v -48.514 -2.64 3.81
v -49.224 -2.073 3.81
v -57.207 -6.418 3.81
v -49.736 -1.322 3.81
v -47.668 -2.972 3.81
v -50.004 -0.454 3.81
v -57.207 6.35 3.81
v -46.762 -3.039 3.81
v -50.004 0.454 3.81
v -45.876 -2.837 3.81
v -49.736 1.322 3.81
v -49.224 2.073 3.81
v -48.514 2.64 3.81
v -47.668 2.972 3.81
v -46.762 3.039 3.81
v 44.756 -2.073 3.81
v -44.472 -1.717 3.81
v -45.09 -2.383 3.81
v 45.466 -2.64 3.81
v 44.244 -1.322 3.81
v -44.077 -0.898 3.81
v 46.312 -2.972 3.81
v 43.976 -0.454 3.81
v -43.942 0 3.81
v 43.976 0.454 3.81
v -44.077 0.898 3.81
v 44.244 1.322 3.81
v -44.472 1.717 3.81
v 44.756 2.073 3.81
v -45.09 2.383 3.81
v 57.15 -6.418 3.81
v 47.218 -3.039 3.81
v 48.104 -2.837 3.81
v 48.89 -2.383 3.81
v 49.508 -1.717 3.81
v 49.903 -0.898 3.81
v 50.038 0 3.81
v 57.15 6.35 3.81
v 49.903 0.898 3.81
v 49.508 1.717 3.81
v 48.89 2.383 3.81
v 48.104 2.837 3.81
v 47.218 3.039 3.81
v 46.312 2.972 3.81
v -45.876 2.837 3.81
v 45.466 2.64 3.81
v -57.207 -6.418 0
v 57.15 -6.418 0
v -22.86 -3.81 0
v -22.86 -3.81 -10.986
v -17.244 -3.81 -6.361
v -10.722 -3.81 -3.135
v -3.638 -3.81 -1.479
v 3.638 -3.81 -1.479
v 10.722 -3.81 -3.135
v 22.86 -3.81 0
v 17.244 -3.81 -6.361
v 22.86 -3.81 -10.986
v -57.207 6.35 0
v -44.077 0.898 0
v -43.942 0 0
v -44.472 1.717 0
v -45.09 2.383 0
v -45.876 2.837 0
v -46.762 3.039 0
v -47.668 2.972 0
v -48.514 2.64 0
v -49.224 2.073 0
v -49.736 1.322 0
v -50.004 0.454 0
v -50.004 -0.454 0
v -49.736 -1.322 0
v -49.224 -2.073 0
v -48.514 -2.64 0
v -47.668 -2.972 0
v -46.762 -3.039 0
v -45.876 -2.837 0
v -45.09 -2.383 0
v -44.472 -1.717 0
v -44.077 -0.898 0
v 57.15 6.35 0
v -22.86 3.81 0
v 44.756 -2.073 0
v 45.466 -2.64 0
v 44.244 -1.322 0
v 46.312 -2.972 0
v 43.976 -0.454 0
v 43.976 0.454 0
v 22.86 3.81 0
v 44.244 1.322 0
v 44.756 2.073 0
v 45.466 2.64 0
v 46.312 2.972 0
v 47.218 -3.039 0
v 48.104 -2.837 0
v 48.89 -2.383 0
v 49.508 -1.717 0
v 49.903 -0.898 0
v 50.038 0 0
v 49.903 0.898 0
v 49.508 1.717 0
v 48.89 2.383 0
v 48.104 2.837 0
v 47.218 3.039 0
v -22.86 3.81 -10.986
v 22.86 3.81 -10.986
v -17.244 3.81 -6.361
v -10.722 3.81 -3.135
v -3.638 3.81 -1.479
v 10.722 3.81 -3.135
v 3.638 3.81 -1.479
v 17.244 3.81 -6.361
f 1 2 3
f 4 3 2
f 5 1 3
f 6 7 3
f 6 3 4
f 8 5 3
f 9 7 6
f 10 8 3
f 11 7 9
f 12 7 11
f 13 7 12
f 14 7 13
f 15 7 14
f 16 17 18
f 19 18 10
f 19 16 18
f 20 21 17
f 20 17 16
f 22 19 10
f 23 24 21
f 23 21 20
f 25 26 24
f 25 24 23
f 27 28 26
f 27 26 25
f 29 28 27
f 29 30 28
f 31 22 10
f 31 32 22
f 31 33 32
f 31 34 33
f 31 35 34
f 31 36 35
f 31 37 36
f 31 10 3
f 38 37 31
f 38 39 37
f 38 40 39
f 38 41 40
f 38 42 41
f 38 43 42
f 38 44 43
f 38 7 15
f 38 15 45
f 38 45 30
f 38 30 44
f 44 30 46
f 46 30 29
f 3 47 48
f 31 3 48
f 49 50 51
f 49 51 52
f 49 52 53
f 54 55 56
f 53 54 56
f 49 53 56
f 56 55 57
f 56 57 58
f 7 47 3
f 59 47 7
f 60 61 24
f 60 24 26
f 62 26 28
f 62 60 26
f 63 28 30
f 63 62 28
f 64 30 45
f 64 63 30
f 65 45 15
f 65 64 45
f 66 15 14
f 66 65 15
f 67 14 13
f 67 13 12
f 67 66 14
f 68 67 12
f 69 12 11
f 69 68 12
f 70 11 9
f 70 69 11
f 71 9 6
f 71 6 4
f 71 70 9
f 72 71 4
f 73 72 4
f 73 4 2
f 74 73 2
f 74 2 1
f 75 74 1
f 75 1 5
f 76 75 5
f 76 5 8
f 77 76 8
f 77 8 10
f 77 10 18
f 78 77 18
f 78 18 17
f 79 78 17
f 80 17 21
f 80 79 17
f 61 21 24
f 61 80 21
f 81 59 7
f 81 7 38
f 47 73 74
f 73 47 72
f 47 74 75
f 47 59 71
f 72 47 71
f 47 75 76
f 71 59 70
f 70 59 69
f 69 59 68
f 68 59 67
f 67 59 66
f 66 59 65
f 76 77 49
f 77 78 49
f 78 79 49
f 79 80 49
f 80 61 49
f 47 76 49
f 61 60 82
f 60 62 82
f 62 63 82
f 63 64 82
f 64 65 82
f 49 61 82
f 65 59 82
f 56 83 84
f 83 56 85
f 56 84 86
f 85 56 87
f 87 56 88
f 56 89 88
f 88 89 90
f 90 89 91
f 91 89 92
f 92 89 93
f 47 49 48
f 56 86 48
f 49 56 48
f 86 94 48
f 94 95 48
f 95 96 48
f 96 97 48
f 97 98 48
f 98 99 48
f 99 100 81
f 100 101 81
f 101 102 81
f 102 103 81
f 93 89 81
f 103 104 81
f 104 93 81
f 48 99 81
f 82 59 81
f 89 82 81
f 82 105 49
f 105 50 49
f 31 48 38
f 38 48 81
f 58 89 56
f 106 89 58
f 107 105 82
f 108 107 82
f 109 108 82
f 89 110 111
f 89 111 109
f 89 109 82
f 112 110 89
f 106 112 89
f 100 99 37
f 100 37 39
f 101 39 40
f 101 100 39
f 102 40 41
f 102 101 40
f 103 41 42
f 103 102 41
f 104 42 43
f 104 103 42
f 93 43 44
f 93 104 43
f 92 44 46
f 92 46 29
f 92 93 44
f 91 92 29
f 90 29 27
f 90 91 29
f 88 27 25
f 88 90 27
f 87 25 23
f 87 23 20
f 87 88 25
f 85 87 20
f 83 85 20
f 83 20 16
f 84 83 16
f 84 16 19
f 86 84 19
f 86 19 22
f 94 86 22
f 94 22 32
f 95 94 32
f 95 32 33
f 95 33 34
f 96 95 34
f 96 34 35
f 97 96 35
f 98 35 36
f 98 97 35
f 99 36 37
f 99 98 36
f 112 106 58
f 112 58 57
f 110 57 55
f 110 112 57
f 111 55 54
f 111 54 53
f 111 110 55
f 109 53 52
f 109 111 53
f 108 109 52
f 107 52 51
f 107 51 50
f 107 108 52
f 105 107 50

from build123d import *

# Parameters (mm, degrees)
SKETCH2_W                = 114.356575713
SKETCH2_H                = 12.768326156
SKETCH2_R                = 3.048
BOSS_EXTRUDE1_DEPTH      = 3.81
BOSS_EXTRUDE2_DEPTH      = 3.81
BOSS_EXTRUDE2_DEPTH_BACK = 3.81


with BuildPart() as part:
    # Sketch2 → Boss-Extrude1 (new body)
    with BuildSketch(Plane.XY):
        with Locations((-0.028287857, -0.034163078)):
            Rectangle(SKETCH2_W, SKETCH2_H)
        with Locations((-46.99, 0)):
            Circle(SKETCH2_R, mode=Mode.SUBTRACT)
        with Locations((46.99, 0)):
            Circle(SKETCH2_R, mode=Mode.SUBTRACT)
    extrude(amount=BOSS_EXTRUDE1_DEPTH)

    # Sketch3 → Boss-Extrude2 (add, two sides)
    with BuildSketch(Plane(origin=(0, 0, 0), x_dir=(1, 0, 0), z_dir=(0, 1, 0))) as boss_extrude2_sk:
        with BuildLine():
            Line((0, 0), (22.86, 0))
            Line((22.86, 0), (22.86, 10.986323502))
            ThreePointArc((22.86, 10.986323502), (0, 1.27), (-22.86, 10.986323502))
            Line((-22.86, 10.986323502), (-22.86, 0))
            Line((-22.86, 0), (0, 0))
        make_face()
    extrude(amount=BOSS_EXTRUDE2_DEPTH)
    extrude(boss_extrude2_sk.sketch, amount=-BOSS_EXTRUDE2_DEPTH_BACK)


solid = part.part
